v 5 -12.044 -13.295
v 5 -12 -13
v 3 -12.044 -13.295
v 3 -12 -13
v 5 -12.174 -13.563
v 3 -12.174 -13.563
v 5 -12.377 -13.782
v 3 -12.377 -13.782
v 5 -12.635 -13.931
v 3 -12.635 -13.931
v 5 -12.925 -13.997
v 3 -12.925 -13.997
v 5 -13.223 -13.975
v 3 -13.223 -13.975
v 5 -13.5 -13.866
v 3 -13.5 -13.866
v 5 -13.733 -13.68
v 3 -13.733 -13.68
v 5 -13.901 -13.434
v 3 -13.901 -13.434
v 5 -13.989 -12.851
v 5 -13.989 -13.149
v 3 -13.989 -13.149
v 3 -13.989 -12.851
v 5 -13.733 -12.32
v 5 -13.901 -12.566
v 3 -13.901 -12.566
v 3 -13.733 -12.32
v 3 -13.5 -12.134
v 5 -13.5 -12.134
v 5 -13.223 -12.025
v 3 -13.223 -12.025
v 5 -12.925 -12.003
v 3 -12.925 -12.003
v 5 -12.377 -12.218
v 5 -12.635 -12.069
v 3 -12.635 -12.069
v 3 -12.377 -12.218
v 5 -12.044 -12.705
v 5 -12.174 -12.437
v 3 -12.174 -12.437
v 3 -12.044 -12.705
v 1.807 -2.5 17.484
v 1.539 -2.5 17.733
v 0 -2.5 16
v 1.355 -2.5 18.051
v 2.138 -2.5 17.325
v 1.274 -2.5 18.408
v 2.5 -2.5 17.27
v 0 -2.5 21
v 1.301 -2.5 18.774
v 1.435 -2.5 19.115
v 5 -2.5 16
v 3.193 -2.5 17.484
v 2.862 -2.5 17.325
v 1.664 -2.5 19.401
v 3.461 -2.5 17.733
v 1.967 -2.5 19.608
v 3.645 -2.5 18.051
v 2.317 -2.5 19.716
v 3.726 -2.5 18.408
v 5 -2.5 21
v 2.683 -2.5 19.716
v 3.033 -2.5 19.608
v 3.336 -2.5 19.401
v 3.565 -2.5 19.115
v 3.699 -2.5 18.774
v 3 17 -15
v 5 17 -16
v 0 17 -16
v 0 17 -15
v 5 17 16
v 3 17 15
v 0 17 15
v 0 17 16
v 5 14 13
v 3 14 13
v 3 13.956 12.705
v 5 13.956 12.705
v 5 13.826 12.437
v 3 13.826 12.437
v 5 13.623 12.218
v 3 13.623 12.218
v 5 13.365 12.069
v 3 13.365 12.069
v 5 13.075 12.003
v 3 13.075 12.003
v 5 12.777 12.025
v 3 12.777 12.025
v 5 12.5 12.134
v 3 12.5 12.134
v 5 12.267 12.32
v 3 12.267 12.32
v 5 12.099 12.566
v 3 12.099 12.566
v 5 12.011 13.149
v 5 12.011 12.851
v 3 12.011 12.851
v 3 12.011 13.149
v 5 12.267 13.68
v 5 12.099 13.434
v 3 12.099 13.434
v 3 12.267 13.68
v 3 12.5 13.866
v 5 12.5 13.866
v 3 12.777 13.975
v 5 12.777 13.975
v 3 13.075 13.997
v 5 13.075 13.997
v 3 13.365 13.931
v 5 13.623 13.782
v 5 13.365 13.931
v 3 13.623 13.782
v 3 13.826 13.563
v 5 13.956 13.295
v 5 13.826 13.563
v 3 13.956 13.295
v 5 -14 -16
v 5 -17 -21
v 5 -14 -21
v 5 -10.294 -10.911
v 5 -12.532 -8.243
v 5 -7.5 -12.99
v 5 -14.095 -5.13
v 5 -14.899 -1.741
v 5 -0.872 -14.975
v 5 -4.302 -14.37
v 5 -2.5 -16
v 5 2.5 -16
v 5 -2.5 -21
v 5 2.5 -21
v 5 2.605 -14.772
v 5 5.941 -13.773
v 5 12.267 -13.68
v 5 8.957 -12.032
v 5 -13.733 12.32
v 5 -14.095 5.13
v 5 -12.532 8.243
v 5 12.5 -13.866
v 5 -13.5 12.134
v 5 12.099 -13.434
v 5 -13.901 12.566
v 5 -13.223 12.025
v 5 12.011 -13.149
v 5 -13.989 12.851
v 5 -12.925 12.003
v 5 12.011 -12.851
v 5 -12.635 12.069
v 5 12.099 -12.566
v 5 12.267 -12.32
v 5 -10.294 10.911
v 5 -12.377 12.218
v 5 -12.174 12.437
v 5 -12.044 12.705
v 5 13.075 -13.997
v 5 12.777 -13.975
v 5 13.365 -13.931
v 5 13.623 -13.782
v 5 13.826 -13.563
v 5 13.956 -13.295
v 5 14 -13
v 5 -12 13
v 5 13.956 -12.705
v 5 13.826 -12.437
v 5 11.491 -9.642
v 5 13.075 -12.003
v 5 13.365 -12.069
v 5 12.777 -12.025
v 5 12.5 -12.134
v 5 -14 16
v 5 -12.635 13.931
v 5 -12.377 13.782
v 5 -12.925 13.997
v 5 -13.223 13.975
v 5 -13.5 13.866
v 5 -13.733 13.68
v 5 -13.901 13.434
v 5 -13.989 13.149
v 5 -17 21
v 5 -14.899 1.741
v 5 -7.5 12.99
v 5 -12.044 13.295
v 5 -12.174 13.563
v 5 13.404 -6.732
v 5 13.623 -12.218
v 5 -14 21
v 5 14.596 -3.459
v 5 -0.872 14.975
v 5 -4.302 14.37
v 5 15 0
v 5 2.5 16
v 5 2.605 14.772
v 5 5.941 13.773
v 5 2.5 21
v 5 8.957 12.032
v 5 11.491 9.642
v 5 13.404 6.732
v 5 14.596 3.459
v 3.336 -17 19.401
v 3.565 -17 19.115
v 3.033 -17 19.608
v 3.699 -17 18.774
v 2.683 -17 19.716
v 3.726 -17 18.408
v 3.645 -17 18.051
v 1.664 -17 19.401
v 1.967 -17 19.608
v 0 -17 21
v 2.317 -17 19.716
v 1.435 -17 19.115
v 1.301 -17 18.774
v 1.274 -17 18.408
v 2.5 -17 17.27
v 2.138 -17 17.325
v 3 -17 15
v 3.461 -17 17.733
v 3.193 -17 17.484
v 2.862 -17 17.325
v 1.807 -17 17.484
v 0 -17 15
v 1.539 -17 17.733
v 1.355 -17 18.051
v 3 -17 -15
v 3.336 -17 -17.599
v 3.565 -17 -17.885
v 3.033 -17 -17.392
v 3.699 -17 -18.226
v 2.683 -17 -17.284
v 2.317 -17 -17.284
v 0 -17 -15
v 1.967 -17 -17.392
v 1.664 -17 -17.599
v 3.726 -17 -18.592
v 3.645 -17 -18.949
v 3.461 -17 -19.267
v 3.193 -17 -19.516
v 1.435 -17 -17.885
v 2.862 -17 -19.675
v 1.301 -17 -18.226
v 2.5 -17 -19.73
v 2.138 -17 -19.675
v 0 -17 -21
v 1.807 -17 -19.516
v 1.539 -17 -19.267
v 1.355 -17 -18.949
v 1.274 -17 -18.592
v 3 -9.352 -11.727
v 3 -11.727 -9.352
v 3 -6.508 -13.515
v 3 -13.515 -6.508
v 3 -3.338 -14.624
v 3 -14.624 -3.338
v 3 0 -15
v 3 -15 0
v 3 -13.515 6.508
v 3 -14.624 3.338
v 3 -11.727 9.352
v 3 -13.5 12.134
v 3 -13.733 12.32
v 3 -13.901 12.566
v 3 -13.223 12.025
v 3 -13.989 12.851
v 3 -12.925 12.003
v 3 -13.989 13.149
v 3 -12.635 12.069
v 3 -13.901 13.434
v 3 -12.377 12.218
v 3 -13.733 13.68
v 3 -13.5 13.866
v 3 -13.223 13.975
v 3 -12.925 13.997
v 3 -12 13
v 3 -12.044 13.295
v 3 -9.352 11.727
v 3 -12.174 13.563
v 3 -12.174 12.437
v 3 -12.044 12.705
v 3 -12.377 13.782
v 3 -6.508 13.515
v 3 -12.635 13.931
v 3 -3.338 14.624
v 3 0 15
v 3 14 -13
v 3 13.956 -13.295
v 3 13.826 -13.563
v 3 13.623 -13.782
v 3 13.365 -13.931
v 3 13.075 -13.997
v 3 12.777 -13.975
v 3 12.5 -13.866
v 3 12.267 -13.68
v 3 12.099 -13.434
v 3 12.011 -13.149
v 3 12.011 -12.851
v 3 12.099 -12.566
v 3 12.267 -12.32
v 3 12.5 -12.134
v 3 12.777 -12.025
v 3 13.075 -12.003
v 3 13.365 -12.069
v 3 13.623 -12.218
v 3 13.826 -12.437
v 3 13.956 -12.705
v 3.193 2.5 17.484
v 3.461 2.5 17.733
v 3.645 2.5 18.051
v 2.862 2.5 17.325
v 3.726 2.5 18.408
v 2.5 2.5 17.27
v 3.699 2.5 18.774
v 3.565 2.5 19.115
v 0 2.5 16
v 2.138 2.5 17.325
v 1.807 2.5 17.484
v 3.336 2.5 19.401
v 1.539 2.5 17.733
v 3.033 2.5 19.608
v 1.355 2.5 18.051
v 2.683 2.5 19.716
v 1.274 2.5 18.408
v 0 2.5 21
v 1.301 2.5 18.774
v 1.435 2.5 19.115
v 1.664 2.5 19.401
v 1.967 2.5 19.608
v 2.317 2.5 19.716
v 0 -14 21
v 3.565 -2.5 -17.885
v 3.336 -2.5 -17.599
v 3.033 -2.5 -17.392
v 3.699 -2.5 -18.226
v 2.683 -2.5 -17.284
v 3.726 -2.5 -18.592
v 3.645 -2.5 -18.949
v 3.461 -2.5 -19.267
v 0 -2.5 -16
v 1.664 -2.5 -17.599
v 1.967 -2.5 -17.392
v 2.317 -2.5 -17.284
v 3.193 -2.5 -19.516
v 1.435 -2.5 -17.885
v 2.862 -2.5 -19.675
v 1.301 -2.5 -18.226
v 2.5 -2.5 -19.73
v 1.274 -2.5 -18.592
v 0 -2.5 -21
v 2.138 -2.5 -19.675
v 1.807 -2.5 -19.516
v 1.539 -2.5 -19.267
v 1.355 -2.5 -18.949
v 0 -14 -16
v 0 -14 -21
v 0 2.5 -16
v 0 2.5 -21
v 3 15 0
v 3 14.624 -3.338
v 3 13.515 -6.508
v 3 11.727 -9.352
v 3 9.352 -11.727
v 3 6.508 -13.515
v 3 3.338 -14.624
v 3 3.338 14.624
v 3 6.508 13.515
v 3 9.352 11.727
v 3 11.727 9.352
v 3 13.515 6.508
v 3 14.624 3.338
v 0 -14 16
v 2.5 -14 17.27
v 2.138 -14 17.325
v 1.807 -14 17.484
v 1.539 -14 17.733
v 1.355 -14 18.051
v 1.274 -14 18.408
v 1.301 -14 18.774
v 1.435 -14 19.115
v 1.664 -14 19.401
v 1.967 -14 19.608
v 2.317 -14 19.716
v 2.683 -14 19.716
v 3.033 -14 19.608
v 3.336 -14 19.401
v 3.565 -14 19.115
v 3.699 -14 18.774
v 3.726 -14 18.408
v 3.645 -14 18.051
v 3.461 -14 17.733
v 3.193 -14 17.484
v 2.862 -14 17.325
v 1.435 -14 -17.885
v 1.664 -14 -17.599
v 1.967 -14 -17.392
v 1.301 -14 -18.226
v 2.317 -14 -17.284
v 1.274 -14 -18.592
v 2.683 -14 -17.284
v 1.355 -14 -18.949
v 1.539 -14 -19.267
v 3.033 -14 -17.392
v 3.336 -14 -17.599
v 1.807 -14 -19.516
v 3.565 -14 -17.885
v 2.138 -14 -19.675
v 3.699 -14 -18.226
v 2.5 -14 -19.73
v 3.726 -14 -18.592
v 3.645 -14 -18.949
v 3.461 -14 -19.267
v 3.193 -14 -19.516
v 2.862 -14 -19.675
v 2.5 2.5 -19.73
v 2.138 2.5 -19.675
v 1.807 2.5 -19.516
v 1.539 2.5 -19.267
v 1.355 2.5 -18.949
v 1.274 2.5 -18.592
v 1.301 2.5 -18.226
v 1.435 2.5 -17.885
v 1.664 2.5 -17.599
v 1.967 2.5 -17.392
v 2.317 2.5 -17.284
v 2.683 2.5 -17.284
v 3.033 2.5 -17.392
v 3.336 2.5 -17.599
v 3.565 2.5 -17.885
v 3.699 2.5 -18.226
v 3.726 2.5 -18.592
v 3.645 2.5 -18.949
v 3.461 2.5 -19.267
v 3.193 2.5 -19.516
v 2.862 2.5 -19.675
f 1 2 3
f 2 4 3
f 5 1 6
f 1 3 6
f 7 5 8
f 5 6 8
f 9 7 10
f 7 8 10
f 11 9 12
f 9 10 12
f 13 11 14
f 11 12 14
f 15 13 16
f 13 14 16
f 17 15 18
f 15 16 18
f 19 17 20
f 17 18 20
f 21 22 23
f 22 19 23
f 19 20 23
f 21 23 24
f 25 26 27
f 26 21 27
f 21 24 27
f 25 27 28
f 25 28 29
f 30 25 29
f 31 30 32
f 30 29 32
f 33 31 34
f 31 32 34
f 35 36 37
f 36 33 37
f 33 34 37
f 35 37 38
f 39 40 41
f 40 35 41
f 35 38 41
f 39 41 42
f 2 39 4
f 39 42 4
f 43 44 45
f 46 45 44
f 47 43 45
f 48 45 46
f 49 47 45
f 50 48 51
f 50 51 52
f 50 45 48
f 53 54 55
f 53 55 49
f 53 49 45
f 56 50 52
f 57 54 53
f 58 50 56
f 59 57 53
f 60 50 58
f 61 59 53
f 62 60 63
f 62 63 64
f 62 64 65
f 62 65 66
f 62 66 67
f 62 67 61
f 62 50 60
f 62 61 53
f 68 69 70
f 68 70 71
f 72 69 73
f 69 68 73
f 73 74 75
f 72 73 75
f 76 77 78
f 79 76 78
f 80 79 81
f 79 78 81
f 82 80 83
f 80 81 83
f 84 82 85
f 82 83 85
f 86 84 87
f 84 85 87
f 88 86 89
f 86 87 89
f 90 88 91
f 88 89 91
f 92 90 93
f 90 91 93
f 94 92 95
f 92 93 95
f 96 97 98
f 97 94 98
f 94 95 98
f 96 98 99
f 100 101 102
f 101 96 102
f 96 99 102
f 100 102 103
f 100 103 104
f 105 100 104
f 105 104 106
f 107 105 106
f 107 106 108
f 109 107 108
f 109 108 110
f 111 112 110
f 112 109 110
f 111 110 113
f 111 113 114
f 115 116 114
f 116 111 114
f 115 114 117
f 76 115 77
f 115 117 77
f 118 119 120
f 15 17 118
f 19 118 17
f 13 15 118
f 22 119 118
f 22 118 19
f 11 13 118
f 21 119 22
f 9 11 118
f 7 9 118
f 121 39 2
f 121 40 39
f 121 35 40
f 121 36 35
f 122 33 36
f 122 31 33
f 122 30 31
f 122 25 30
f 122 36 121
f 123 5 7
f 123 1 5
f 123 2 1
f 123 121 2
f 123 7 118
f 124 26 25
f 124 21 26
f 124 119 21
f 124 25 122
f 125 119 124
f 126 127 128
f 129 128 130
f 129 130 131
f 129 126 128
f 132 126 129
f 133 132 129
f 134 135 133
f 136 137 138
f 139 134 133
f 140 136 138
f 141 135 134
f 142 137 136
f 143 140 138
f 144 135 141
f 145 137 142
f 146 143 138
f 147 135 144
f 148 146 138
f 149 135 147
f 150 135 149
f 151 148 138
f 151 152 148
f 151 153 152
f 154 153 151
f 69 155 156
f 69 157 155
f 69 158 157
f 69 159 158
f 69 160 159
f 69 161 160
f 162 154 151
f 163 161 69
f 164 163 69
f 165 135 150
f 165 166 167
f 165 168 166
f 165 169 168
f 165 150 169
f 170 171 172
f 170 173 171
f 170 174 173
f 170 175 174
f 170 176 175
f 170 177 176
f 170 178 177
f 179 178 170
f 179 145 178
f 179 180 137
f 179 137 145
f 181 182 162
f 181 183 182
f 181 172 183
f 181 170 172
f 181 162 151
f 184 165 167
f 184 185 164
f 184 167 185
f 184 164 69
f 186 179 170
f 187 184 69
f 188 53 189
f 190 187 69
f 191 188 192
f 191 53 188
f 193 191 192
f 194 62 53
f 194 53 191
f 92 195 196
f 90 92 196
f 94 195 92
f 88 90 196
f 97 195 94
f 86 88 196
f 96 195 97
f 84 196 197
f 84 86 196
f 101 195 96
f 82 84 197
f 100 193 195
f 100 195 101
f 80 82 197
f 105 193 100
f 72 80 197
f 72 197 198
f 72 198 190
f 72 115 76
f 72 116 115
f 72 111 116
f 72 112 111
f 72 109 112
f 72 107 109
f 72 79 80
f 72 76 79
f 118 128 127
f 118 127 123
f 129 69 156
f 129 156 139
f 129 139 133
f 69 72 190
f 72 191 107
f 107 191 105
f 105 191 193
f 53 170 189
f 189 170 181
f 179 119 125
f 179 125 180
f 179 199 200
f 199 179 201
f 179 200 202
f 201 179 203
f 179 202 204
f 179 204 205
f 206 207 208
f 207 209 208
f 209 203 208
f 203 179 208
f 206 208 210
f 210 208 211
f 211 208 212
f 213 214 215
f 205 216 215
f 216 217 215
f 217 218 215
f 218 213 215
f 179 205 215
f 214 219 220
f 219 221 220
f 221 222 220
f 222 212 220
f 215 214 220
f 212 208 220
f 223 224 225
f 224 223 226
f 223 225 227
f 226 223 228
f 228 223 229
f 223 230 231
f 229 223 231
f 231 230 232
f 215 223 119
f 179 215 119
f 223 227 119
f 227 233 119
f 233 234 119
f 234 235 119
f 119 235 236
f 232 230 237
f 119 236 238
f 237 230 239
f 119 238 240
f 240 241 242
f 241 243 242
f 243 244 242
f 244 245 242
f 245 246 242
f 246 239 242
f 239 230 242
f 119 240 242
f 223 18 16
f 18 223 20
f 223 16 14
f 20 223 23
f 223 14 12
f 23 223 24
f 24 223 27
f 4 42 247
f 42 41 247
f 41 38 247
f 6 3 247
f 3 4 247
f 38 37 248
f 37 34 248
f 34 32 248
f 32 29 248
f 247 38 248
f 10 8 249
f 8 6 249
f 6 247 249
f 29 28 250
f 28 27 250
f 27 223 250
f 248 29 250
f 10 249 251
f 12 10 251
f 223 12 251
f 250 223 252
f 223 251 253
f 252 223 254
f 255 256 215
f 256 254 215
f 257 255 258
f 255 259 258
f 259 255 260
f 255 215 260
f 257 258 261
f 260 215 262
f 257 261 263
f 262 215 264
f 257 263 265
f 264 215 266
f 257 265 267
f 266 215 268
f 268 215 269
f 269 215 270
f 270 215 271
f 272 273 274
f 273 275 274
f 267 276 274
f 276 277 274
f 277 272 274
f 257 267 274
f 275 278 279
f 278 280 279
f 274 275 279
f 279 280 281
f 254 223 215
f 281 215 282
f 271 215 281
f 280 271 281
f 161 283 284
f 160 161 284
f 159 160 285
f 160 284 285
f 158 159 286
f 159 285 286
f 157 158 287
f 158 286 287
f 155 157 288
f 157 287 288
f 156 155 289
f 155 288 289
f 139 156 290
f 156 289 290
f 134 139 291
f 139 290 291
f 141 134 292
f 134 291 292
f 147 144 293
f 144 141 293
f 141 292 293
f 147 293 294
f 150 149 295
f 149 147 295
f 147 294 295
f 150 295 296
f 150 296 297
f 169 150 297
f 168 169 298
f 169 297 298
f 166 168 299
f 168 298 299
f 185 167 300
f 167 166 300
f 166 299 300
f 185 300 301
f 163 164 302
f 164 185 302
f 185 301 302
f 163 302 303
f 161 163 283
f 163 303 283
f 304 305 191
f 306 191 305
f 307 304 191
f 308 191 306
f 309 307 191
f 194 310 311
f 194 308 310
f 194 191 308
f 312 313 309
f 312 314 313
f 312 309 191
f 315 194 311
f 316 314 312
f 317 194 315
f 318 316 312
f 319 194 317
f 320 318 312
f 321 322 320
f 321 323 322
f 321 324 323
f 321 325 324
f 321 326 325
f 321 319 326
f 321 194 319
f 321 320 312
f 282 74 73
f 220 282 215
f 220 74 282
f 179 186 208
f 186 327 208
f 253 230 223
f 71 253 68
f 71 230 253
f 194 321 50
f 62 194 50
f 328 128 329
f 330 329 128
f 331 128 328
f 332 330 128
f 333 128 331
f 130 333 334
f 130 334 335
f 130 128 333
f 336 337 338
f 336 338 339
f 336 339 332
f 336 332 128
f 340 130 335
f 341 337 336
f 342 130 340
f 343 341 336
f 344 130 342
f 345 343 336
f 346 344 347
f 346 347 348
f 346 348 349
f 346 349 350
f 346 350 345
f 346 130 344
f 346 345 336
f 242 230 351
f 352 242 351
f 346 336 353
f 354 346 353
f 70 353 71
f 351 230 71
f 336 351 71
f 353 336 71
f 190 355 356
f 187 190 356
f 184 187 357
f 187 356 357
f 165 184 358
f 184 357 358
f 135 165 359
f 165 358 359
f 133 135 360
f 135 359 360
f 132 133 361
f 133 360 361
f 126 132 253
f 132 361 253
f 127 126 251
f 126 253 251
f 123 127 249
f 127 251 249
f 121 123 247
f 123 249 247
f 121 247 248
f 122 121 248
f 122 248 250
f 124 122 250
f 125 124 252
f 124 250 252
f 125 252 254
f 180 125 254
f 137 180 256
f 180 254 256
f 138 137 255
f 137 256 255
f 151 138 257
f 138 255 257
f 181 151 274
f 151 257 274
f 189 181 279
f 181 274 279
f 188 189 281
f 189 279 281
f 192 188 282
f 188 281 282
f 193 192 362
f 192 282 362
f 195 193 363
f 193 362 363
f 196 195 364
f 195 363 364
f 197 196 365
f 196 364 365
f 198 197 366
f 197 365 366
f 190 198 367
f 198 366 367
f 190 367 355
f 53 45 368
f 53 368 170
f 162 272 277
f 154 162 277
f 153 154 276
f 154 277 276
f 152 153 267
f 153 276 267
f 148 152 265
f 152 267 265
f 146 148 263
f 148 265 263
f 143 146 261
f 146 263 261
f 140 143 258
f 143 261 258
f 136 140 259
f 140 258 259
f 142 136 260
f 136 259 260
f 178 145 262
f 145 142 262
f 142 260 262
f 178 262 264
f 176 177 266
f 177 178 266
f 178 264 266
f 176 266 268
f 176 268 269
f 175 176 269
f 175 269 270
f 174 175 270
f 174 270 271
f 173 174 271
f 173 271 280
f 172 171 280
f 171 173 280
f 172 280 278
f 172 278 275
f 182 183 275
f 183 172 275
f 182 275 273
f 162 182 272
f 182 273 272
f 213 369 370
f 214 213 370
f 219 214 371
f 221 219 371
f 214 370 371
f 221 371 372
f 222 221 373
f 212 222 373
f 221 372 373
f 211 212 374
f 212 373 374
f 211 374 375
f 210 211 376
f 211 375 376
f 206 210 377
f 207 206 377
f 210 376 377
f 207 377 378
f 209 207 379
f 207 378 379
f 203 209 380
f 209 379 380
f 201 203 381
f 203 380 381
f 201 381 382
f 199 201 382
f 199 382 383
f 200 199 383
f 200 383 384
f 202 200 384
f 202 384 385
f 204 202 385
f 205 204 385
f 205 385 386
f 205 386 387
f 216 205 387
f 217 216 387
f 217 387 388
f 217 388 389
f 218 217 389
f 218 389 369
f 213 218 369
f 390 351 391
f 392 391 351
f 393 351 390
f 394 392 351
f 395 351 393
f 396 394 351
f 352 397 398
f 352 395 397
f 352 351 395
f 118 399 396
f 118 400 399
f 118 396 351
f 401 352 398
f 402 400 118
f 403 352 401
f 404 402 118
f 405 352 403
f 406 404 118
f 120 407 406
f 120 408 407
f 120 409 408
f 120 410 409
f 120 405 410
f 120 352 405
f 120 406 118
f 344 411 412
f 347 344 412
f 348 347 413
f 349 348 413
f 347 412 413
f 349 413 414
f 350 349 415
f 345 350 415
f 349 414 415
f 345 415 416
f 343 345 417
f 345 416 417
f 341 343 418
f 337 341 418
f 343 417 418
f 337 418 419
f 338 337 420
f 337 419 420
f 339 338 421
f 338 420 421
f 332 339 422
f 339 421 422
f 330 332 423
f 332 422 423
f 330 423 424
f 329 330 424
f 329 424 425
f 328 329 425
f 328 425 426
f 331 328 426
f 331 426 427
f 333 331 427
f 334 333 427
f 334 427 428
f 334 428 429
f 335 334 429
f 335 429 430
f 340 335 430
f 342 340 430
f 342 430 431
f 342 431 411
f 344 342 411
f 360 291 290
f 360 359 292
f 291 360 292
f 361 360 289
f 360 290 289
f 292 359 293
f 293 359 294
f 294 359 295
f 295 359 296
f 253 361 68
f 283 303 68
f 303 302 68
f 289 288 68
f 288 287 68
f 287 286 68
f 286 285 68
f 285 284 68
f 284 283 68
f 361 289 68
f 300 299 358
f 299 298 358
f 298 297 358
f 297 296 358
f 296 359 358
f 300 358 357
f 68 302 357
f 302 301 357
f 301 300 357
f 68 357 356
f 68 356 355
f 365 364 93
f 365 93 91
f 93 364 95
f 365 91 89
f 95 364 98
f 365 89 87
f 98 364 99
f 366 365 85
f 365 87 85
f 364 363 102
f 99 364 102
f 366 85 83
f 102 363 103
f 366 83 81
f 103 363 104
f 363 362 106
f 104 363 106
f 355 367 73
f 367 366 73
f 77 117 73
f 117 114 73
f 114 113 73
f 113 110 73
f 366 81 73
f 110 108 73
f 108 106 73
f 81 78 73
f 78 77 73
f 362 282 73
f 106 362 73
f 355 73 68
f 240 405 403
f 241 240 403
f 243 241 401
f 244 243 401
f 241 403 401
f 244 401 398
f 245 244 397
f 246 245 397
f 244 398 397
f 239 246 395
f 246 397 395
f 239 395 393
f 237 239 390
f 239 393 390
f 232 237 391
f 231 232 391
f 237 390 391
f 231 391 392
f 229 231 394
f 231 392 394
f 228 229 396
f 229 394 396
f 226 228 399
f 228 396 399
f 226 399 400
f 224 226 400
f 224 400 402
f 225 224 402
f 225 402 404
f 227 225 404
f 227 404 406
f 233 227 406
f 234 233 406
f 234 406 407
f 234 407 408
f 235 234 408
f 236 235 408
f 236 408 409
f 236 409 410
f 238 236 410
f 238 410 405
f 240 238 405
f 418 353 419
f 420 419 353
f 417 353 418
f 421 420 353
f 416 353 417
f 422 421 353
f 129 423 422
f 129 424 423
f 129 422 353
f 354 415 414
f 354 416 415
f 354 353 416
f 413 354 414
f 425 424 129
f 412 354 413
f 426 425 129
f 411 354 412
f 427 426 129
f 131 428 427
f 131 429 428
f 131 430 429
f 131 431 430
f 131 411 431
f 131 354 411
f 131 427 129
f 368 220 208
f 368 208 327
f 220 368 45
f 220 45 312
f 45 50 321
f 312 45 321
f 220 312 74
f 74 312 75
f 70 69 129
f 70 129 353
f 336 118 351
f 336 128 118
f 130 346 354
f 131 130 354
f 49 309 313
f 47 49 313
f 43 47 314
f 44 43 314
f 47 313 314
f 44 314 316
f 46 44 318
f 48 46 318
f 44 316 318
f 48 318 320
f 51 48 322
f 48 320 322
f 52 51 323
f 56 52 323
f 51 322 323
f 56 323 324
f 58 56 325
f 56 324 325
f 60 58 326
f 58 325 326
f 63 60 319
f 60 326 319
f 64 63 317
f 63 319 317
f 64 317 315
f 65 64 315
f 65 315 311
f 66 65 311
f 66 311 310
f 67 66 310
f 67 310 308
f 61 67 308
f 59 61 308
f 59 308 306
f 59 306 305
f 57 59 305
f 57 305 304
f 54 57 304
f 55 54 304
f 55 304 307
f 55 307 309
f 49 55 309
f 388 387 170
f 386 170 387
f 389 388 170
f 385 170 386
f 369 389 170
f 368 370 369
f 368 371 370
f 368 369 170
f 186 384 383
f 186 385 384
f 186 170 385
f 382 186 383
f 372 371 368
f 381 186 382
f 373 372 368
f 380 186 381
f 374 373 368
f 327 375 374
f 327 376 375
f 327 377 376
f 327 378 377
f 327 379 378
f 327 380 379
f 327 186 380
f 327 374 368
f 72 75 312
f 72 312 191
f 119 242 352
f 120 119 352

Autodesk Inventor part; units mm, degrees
ref_plane "YZ Plane" through (0, 0, 0) normal (1, 0, 0) x (0, 1, 0)
ref_plane "XZ Plane" through (0, 0, 0) normal (0, 1, 0) x (-1, 0, 0)
ref_plane "XY Plane" through (0, 0, 0) normal (0, 0, 1) x (1, 0, 0)
sketch "Sketch1" plane through (0, 0, 0) normal (1, 0, 0) x (0, 1, 0)
  circle A0 centre (0, 0) radius 15
  line L0 (15, 15) -> (-15, 15)
  line L1 (-15, 15) -> (-15, -15) construction
  line L2 (-15, -15) -> (15, -15)
  line L3 (15, -15) -> (15, 15) construction
  line L4 (15, 15) -> (-15, -15) construction
  line L5 (-15, 15) -> (15, -15) construction
  line L6 (17, 21) -> (-17, 21)
  line L7 (-17, 21) -> (-17, -21)
  line L8 (-17, -21) -> (17, -21)
  line L9 (17, -21) -> (17, 21)
  line L10 (17, 21) -> (-17, -21) construction
  line L11 (-17, 21) -> (17, -21) construction
  circle A1 centre (13, -13) radius 1
  circle A2 centre (13, 13) radius 1
  circle A3 centre (-13, -13) radius 1
  circle A4 centre (-13, 13) radius 1
  line L12 (17, -15) -> (15, -15)
  line L13 (-15, -15) -> (-17, -15)
  line L14 (17, 15) -> (15, 15)
  line L15 (-15, 15) -> (-17, 15)
  point P0 (0, -15)
  point P1 (0, 15)
  dimension "d0" = 30
  dimension "d1" = 42
  dimension "d2" = 34
  dimension "d10" = 2
  dimension "d11" = 2
  dimension "d14" = 26
  dimension "d17" = 26
sketch "Sketch2" plane through (0, 0, 0) normal (0, 1, 0) x (-1, 0, 0)
  line L0 (190, 50) -> (-10, 50)
  line L1 (-10, 50) -> (-10, -50)
  line L2 (-10, -50) -> (190, -50)
  line L3 (190, -50) -> (190, 50)
  point P0 (0, 0)
  point P1 (-10, 0)
  dimension "d3" = 200
  dimension "d4" = 100
  dimension "d5" = 10
extrude "Extrusion1" add sketch "Sketch1" along normal blind 5 contours A0 | A0 L0 L14 L9 L12 L2 | L0 L15 L7 L6 L9 L14 | A0 L2 L13 L7 L15 L0 | L2 L12 L9 L8 L7 L13 | A1 | A2 | A3 | A4
extrude "Extrusion4" cut sketch "Sketch1" along normal blind 3 contours A0 L0 L14 L9 L12 L2 | A0 L2 L13 L7 L15 L0
extrude "Extrusion3" cut sketch "Sketch1" along normal blind 5 contours A0 | A1 | A2 | A3 | A4
sketch "Sketch3" plane through (0, -17, 21) normal (0, 0, 1) x (1, 0, 0)
  line L0 (0, 34) -> (0, 0) projected
  line L1 (0, 0) -> (5, 0) projected
  line L2 (5, 34) -> (5, 0) projected
  line L3 (0, 34) -> (5, 34) projected
  line L4 (0, 0) -> (0, 34) projected
  line L5 (5, 0) -> (5, 34) projected
  line L6 (0, 14.5) -> (5, 14.5)
  line L7 (5, 14.5) -> (5, 3)
  line L8 (5, 3) -> (0, 3)
  line L9 (0, 3) -> (0, 14.5)
  line L10 (0, 34) -> (5, 34)
  line L11 (5, 34) -> (5, 19.5)
  line L12 (5, 19.5) -> (0, 19.5)
  line L13 (0, 19.5) -> (0, 34)
  point P0 (0, 17)
  point P1 (0, 17)
  point P2 (0, 3)
  point P3 (5, 3)
  point P4 (0, 19.5)
  dimension "d26" = 3
  dimension "d27" = 5
  dimension "d29" = 2.5
extrude "Extrusion5" cut sketch "Sketch3" against normal blind 5 contours L3 L2 L12 L0 | L6 L2 L8 L0
mirror "Mirror1" about plane through (0, 0, 0) normal (0, 0, 1) of "Extrusion5"
sketch "Sketch4" plane through (0, -17, -21) normal (0, -1, 0) x (1, 0, 0)
  line L0 (5, 42) -> (5, 0) projected
  line L1 (0, 0) -> (5, 0) projected
  line L2 (0, 42) -> (5, 42) projected
  point P0 (0, 21)
  point P1 (2.5, 39.5)
  point P2 (2.5, 2.5)
  dimension "d39" = 2.5
  dimension "d40" = 2.5
  dimension "d41" = 2.5
  dimension "d42" = 2.5
hole "Hole1" at (2.5, -17, 18.5) at (2.5, -17, -18.5) direction (0, 1, 0) diameter 2.459 end through all thread size "M3x0.5" class "6H" standard "ISO Metric profile"
properties part number "Camera holder"
